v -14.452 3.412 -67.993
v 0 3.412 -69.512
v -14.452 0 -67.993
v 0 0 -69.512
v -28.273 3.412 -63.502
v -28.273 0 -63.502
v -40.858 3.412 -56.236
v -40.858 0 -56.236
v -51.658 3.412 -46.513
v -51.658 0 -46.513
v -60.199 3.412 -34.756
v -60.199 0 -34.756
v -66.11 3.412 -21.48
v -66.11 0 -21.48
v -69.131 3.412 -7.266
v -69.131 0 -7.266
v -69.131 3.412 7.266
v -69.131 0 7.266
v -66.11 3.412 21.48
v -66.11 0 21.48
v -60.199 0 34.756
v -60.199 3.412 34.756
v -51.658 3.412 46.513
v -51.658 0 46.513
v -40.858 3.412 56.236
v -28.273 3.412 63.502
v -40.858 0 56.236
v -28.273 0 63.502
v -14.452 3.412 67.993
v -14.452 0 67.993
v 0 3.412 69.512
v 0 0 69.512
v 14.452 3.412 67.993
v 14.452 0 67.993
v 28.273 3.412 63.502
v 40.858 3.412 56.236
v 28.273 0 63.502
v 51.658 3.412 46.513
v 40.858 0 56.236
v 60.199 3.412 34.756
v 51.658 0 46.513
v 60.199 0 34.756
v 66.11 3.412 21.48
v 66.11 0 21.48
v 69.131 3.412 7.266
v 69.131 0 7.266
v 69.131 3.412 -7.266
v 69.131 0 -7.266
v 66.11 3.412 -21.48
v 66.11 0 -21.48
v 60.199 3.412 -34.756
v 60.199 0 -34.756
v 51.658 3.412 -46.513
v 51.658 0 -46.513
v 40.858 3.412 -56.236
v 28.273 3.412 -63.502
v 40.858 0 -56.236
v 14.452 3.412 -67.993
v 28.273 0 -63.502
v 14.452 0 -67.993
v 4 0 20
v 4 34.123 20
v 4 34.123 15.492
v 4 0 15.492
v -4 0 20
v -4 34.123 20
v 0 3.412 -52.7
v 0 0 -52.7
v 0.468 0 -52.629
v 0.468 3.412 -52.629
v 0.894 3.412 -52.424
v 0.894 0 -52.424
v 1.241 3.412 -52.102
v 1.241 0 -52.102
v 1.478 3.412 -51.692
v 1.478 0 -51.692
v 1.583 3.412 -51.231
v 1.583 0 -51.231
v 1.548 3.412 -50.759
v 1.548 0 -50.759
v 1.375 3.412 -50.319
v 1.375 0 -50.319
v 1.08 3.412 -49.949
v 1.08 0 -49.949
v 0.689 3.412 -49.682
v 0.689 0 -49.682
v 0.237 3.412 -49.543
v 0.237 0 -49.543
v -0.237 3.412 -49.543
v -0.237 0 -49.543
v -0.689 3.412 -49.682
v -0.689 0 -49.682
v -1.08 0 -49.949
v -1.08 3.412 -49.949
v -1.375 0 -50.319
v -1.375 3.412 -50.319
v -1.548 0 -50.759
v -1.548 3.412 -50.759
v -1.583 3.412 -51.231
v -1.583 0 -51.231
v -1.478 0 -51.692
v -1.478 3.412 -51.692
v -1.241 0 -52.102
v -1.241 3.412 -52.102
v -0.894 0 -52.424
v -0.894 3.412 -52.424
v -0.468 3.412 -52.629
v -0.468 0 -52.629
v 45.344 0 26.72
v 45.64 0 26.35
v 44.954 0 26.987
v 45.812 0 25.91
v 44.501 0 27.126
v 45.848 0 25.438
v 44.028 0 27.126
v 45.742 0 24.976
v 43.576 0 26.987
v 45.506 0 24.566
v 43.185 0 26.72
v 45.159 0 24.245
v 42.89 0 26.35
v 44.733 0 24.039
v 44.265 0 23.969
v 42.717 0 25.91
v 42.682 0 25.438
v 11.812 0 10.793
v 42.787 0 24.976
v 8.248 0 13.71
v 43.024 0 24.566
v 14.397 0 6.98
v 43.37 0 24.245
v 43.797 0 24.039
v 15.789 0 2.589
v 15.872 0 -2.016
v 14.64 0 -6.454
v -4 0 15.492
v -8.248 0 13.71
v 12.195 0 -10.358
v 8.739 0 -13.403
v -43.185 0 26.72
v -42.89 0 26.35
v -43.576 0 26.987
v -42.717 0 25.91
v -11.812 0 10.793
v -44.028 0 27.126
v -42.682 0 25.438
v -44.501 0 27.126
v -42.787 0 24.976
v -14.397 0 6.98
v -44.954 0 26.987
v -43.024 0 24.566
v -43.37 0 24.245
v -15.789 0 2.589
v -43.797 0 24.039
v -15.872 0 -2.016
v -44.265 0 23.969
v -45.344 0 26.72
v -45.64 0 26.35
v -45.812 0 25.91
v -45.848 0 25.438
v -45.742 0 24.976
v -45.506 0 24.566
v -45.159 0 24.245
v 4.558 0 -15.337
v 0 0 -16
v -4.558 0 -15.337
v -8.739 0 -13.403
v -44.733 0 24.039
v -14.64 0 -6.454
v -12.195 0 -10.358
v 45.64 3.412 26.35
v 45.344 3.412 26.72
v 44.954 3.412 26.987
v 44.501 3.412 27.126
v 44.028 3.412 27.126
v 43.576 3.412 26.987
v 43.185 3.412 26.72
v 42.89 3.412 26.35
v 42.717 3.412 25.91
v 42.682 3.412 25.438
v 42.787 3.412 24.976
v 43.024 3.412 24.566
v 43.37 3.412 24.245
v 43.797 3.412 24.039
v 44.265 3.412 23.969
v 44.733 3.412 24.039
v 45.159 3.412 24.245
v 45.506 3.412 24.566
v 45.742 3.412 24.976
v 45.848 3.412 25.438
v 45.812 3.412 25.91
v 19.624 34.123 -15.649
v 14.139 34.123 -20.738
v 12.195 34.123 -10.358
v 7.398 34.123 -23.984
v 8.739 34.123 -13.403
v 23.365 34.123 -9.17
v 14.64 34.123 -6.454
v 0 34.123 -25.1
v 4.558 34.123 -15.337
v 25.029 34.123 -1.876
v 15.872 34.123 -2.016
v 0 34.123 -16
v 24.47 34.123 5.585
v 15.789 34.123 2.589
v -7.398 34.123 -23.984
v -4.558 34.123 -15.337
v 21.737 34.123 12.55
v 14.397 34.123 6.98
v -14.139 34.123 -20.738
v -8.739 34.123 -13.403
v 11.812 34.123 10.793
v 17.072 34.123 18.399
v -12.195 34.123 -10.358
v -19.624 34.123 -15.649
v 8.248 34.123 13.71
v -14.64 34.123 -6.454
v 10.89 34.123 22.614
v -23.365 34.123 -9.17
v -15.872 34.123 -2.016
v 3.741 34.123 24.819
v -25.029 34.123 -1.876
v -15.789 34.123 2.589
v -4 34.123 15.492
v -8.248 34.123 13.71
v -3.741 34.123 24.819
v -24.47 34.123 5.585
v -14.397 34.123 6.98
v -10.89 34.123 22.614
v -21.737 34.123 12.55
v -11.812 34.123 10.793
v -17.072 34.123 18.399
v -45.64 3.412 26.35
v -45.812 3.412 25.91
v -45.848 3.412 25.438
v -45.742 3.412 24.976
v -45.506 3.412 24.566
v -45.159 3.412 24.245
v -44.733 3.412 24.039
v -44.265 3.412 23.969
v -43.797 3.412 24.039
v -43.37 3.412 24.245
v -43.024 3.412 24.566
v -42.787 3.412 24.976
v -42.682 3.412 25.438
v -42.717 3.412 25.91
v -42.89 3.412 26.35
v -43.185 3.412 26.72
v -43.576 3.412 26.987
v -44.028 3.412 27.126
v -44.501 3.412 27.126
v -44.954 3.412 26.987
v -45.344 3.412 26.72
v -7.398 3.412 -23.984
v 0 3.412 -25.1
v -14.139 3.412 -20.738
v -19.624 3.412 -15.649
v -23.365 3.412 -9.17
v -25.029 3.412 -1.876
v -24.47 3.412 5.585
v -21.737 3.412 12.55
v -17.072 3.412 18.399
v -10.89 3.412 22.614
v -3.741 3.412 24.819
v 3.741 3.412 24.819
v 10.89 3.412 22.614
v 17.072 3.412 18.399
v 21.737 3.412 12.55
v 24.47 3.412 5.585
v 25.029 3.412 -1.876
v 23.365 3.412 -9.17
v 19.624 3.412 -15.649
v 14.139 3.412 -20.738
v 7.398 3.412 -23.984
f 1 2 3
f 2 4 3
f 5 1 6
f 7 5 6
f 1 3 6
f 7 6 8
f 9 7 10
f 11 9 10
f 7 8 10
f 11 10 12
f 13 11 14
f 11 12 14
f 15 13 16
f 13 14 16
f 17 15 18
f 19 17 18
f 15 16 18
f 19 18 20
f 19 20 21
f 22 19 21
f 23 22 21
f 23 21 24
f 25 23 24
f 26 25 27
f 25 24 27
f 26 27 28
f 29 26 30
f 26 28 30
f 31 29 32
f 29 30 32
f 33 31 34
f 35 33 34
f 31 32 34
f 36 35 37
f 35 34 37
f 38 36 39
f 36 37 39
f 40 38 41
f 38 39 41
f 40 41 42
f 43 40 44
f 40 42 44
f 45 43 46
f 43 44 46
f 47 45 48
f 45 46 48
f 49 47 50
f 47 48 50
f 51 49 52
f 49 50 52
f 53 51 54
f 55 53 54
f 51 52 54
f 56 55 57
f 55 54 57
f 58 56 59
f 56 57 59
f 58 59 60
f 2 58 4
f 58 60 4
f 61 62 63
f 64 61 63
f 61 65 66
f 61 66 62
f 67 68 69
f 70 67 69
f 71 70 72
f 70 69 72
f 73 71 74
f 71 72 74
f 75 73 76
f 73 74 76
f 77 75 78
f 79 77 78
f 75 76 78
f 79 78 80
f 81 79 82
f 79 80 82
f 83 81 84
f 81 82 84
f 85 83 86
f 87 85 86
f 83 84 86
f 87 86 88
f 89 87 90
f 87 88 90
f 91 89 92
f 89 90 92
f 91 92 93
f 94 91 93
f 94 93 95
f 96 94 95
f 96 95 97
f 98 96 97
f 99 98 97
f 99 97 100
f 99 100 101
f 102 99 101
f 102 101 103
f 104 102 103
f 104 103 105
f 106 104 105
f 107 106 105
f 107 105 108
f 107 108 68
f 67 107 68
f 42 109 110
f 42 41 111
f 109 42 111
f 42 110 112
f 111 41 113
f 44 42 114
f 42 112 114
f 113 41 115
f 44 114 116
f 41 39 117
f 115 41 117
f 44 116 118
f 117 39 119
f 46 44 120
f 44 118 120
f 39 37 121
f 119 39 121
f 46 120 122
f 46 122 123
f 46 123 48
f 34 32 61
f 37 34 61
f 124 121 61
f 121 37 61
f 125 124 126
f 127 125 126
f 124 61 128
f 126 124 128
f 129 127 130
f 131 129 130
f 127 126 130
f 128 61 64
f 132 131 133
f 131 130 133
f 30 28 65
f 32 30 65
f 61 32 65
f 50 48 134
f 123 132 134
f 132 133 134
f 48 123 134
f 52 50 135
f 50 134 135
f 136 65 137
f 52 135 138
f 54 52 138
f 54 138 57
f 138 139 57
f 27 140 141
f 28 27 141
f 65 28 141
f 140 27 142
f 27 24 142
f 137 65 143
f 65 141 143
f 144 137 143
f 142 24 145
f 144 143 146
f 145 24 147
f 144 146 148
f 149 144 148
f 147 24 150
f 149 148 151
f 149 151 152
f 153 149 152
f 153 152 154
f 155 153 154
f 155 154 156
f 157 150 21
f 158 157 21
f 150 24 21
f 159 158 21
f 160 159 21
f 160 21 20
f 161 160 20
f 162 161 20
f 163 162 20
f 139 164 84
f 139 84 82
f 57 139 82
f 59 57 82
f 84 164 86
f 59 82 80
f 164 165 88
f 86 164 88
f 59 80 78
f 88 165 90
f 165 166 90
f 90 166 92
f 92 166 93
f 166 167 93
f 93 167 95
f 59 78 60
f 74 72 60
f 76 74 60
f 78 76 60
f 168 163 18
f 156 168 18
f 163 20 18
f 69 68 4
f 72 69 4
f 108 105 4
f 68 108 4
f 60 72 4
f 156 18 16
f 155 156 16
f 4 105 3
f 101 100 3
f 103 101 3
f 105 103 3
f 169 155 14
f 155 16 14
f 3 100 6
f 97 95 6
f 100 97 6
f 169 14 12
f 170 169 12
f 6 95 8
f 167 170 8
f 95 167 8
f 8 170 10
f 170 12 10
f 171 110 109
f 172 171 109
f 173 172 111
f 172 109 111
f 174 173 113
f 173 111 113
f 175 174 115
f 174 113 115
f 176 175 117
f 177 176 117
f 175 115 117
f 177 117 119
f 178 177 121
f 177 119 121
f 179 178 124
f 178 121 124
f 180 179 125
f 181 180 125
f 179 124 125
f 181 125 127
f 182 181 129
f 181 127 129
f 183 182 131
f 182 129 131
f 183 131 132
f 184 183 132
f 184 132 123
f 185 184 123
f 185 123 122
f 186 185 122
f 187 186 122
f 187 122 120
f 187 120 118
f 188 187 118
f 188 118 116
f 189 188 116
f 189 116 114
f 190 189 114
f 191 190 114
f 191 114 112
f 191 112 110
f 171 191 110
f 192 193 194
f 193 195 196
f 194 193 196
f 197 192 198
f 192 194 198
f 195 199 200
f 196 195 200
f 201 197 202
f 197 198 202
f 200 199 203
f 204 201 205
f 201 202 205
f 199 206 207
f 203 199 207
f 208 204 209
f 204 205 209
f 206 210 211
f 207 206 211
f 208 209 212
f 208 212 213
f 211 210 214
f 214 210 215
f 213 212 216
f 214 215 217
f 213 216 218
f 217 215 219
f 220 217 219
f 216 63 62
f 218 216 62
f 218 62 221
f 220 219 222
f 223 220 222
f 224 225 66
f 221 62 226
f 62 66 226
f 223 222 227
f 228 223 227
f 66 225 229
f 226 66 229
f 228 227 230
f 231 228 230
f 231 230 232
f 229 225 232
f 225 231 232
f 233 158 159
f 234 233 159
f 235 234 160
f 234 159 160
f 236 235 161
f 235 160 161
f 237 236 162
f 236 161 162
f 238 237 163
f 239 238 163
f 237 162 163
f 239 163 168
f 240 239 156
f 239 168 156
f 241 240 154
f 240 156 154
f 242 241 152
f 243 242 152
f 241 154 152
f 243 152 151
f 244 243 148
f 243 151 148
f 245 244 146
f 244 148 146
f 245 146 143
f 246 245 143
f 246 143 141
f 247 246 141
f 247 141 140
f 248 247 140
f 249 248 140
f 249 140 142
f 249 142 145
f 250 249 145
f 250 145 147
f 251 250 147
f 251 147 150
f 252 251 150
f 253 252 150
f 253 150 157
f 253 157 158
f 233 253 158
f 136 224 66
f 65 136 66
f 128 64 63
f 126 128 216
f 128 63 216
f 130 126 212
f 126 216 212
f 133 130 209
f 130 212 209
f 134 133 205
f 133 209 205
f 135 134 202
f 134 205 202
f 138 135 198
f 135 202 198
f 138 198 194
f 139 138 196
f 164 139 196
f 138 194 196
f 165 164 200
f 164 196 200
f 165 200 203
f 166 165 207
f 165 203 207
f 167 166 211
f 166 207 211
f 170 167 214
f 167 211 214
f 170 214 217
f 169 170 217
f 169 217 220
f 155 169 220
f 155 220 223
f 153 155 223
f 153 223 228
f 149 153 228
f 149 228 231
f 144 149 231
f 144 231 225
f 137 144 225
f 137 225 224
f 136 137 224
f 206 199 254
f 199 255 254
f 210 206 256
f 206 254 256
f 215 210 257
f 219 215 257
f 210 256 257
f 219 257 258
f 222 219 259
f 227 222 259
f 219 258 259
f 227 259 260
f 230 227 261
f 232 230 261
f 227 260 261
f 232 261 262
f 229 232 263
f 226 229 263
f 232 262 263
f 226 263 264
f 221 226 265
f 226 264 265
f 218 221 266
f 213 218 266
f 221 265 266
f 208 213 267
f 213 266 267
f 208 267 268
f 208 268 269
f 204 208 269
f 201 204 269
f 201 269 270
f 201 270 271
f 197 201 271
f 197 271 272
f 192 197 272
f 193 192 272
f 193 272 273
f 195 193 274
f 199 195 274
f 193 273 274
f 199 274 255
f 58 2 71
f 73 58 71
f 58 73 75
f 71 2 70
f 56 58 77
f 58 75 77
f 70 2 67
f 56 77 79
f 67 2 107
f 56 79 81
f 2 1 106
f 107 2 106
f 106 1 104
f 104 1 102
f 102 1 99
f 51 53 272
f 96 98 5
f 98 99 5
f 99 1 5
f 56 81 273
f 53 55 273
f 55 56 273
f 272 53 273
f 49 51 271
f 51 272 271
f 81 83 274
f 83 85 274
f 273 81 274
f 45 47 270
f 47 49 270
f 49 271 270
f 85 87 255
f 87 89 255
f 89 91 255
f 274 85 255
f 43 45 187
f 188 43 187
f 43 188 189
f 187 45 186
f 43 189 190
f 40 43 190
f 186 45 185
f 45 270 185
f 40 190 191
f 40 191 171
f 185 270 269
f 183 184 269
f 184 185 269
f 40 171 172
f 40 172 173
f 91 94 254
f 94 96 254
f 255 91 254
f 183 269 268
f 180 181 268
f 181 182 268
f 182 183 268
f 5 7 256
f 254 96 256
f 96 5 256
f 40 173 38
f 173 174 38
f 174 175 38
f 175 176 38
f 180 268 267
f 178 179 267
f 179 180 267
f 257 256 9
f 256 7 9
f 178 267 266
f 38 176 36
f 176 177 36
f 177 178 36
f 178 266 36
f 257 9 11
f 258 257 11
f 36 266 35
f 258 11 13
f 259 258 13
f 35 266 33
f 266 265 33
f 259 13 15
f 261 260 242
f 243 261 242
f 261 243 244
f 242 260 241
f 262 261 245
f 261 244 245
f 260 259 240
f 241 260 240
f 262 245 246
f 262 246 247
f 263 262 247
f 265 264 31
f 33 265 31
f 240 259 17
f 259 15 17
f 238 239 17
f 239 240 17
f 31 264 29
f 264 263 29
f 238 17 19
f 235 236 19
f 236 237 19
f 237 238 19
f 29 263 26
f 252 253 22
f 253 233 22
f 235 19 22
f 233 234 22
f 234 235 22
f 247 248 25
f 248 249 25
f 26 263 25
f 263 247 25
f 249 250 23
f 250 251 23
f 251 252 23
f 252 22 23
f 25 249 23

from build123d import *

# Parameters (mm, degrees)
F_1_8_0_125_DIAMETER_HOLE1_D = 3.175
CIRPATTERN2_COUNT            = 3
CIRPATTERN1_COUNT            = 3
CUT_EXTRUDE2_DEPTH           = 105.059003061


with BuildPart() as part:
    # Sketch1 → Revolve1 (revolve)
    with BuildSketch(Plane.XY, mode=Mode.PRIVATE) as revolve1_sk:
        Polygon((69.512129733, 0), (16, 0), (16, 34.123360884), (25.099562902, 34.123360884), (25.099562902, 3.412336088), (69.512129733, 3.412336088), align=None)
    revolve(revolve1_sk.sketch.rotate(Axis((0, 0, 0), (0, 1, 0)), 90), axis=Axis((0, 0, 0), (0, 1, 0)))

    # 1/8 (0.125) Diameter Hole1 (through all)
    with Locations(Plane(origin=(0, 3.412336088, -51.1125), x_dir=(0, 0, 1), z_dir=(0, 1, 0))):
        with Locations((0, 0)):
            f_1_8_0_125_diameter_hole1 = Hole(F_1_8_0_125_DIAMETER_HOLE1_D / 2)

    # CirPattern2: 1/8 (0.125) Diameter Hole1 ×3 about axis
    cirpattern2_axis = Axis((0, 0, 0), (0, 1, 0))
    for i in range(1, CIRPATTERN2_COUNT):
        add(f_1_8_0_125_diameter_hole1.rotate(cirpattern2_axis, i * 360 / CIRPATTERN2_COUNT), mode=Mode.SUBTRACT)

    # CirPattern1: 1/8 (0.125) Diameter Hole1 ×3 about axis
    cirpattern1_axis = Axis((0, 3.412336088, 0), (0, -1, 0))
    for i in range(1, CIRPATTERN1_COUNT):
        add(f_1_8_0_125_diameter_hole1.rotate(cirpattern1_axis, i * 360 / CIRPATTERN1_COUNT), mode=Mode.SUBTRACT)

    # Sketch4 → Cut-Extrude2 (cut, through all)
    with BuildSketch(Plane(origin=(0, 34.123360884, 0), x_dir=(1, 0, 0), z_dir=(0, 1, 0))):
        Polygon((0, -20), (4, -20), (4, -14.234250842), (-4, -14.234250842), (-4, -20), align=None)
    extrude(amount=-CUT_EXTRUDE2_DEPTH, mode=Mode.SUBTRACT)


solid = part.part
